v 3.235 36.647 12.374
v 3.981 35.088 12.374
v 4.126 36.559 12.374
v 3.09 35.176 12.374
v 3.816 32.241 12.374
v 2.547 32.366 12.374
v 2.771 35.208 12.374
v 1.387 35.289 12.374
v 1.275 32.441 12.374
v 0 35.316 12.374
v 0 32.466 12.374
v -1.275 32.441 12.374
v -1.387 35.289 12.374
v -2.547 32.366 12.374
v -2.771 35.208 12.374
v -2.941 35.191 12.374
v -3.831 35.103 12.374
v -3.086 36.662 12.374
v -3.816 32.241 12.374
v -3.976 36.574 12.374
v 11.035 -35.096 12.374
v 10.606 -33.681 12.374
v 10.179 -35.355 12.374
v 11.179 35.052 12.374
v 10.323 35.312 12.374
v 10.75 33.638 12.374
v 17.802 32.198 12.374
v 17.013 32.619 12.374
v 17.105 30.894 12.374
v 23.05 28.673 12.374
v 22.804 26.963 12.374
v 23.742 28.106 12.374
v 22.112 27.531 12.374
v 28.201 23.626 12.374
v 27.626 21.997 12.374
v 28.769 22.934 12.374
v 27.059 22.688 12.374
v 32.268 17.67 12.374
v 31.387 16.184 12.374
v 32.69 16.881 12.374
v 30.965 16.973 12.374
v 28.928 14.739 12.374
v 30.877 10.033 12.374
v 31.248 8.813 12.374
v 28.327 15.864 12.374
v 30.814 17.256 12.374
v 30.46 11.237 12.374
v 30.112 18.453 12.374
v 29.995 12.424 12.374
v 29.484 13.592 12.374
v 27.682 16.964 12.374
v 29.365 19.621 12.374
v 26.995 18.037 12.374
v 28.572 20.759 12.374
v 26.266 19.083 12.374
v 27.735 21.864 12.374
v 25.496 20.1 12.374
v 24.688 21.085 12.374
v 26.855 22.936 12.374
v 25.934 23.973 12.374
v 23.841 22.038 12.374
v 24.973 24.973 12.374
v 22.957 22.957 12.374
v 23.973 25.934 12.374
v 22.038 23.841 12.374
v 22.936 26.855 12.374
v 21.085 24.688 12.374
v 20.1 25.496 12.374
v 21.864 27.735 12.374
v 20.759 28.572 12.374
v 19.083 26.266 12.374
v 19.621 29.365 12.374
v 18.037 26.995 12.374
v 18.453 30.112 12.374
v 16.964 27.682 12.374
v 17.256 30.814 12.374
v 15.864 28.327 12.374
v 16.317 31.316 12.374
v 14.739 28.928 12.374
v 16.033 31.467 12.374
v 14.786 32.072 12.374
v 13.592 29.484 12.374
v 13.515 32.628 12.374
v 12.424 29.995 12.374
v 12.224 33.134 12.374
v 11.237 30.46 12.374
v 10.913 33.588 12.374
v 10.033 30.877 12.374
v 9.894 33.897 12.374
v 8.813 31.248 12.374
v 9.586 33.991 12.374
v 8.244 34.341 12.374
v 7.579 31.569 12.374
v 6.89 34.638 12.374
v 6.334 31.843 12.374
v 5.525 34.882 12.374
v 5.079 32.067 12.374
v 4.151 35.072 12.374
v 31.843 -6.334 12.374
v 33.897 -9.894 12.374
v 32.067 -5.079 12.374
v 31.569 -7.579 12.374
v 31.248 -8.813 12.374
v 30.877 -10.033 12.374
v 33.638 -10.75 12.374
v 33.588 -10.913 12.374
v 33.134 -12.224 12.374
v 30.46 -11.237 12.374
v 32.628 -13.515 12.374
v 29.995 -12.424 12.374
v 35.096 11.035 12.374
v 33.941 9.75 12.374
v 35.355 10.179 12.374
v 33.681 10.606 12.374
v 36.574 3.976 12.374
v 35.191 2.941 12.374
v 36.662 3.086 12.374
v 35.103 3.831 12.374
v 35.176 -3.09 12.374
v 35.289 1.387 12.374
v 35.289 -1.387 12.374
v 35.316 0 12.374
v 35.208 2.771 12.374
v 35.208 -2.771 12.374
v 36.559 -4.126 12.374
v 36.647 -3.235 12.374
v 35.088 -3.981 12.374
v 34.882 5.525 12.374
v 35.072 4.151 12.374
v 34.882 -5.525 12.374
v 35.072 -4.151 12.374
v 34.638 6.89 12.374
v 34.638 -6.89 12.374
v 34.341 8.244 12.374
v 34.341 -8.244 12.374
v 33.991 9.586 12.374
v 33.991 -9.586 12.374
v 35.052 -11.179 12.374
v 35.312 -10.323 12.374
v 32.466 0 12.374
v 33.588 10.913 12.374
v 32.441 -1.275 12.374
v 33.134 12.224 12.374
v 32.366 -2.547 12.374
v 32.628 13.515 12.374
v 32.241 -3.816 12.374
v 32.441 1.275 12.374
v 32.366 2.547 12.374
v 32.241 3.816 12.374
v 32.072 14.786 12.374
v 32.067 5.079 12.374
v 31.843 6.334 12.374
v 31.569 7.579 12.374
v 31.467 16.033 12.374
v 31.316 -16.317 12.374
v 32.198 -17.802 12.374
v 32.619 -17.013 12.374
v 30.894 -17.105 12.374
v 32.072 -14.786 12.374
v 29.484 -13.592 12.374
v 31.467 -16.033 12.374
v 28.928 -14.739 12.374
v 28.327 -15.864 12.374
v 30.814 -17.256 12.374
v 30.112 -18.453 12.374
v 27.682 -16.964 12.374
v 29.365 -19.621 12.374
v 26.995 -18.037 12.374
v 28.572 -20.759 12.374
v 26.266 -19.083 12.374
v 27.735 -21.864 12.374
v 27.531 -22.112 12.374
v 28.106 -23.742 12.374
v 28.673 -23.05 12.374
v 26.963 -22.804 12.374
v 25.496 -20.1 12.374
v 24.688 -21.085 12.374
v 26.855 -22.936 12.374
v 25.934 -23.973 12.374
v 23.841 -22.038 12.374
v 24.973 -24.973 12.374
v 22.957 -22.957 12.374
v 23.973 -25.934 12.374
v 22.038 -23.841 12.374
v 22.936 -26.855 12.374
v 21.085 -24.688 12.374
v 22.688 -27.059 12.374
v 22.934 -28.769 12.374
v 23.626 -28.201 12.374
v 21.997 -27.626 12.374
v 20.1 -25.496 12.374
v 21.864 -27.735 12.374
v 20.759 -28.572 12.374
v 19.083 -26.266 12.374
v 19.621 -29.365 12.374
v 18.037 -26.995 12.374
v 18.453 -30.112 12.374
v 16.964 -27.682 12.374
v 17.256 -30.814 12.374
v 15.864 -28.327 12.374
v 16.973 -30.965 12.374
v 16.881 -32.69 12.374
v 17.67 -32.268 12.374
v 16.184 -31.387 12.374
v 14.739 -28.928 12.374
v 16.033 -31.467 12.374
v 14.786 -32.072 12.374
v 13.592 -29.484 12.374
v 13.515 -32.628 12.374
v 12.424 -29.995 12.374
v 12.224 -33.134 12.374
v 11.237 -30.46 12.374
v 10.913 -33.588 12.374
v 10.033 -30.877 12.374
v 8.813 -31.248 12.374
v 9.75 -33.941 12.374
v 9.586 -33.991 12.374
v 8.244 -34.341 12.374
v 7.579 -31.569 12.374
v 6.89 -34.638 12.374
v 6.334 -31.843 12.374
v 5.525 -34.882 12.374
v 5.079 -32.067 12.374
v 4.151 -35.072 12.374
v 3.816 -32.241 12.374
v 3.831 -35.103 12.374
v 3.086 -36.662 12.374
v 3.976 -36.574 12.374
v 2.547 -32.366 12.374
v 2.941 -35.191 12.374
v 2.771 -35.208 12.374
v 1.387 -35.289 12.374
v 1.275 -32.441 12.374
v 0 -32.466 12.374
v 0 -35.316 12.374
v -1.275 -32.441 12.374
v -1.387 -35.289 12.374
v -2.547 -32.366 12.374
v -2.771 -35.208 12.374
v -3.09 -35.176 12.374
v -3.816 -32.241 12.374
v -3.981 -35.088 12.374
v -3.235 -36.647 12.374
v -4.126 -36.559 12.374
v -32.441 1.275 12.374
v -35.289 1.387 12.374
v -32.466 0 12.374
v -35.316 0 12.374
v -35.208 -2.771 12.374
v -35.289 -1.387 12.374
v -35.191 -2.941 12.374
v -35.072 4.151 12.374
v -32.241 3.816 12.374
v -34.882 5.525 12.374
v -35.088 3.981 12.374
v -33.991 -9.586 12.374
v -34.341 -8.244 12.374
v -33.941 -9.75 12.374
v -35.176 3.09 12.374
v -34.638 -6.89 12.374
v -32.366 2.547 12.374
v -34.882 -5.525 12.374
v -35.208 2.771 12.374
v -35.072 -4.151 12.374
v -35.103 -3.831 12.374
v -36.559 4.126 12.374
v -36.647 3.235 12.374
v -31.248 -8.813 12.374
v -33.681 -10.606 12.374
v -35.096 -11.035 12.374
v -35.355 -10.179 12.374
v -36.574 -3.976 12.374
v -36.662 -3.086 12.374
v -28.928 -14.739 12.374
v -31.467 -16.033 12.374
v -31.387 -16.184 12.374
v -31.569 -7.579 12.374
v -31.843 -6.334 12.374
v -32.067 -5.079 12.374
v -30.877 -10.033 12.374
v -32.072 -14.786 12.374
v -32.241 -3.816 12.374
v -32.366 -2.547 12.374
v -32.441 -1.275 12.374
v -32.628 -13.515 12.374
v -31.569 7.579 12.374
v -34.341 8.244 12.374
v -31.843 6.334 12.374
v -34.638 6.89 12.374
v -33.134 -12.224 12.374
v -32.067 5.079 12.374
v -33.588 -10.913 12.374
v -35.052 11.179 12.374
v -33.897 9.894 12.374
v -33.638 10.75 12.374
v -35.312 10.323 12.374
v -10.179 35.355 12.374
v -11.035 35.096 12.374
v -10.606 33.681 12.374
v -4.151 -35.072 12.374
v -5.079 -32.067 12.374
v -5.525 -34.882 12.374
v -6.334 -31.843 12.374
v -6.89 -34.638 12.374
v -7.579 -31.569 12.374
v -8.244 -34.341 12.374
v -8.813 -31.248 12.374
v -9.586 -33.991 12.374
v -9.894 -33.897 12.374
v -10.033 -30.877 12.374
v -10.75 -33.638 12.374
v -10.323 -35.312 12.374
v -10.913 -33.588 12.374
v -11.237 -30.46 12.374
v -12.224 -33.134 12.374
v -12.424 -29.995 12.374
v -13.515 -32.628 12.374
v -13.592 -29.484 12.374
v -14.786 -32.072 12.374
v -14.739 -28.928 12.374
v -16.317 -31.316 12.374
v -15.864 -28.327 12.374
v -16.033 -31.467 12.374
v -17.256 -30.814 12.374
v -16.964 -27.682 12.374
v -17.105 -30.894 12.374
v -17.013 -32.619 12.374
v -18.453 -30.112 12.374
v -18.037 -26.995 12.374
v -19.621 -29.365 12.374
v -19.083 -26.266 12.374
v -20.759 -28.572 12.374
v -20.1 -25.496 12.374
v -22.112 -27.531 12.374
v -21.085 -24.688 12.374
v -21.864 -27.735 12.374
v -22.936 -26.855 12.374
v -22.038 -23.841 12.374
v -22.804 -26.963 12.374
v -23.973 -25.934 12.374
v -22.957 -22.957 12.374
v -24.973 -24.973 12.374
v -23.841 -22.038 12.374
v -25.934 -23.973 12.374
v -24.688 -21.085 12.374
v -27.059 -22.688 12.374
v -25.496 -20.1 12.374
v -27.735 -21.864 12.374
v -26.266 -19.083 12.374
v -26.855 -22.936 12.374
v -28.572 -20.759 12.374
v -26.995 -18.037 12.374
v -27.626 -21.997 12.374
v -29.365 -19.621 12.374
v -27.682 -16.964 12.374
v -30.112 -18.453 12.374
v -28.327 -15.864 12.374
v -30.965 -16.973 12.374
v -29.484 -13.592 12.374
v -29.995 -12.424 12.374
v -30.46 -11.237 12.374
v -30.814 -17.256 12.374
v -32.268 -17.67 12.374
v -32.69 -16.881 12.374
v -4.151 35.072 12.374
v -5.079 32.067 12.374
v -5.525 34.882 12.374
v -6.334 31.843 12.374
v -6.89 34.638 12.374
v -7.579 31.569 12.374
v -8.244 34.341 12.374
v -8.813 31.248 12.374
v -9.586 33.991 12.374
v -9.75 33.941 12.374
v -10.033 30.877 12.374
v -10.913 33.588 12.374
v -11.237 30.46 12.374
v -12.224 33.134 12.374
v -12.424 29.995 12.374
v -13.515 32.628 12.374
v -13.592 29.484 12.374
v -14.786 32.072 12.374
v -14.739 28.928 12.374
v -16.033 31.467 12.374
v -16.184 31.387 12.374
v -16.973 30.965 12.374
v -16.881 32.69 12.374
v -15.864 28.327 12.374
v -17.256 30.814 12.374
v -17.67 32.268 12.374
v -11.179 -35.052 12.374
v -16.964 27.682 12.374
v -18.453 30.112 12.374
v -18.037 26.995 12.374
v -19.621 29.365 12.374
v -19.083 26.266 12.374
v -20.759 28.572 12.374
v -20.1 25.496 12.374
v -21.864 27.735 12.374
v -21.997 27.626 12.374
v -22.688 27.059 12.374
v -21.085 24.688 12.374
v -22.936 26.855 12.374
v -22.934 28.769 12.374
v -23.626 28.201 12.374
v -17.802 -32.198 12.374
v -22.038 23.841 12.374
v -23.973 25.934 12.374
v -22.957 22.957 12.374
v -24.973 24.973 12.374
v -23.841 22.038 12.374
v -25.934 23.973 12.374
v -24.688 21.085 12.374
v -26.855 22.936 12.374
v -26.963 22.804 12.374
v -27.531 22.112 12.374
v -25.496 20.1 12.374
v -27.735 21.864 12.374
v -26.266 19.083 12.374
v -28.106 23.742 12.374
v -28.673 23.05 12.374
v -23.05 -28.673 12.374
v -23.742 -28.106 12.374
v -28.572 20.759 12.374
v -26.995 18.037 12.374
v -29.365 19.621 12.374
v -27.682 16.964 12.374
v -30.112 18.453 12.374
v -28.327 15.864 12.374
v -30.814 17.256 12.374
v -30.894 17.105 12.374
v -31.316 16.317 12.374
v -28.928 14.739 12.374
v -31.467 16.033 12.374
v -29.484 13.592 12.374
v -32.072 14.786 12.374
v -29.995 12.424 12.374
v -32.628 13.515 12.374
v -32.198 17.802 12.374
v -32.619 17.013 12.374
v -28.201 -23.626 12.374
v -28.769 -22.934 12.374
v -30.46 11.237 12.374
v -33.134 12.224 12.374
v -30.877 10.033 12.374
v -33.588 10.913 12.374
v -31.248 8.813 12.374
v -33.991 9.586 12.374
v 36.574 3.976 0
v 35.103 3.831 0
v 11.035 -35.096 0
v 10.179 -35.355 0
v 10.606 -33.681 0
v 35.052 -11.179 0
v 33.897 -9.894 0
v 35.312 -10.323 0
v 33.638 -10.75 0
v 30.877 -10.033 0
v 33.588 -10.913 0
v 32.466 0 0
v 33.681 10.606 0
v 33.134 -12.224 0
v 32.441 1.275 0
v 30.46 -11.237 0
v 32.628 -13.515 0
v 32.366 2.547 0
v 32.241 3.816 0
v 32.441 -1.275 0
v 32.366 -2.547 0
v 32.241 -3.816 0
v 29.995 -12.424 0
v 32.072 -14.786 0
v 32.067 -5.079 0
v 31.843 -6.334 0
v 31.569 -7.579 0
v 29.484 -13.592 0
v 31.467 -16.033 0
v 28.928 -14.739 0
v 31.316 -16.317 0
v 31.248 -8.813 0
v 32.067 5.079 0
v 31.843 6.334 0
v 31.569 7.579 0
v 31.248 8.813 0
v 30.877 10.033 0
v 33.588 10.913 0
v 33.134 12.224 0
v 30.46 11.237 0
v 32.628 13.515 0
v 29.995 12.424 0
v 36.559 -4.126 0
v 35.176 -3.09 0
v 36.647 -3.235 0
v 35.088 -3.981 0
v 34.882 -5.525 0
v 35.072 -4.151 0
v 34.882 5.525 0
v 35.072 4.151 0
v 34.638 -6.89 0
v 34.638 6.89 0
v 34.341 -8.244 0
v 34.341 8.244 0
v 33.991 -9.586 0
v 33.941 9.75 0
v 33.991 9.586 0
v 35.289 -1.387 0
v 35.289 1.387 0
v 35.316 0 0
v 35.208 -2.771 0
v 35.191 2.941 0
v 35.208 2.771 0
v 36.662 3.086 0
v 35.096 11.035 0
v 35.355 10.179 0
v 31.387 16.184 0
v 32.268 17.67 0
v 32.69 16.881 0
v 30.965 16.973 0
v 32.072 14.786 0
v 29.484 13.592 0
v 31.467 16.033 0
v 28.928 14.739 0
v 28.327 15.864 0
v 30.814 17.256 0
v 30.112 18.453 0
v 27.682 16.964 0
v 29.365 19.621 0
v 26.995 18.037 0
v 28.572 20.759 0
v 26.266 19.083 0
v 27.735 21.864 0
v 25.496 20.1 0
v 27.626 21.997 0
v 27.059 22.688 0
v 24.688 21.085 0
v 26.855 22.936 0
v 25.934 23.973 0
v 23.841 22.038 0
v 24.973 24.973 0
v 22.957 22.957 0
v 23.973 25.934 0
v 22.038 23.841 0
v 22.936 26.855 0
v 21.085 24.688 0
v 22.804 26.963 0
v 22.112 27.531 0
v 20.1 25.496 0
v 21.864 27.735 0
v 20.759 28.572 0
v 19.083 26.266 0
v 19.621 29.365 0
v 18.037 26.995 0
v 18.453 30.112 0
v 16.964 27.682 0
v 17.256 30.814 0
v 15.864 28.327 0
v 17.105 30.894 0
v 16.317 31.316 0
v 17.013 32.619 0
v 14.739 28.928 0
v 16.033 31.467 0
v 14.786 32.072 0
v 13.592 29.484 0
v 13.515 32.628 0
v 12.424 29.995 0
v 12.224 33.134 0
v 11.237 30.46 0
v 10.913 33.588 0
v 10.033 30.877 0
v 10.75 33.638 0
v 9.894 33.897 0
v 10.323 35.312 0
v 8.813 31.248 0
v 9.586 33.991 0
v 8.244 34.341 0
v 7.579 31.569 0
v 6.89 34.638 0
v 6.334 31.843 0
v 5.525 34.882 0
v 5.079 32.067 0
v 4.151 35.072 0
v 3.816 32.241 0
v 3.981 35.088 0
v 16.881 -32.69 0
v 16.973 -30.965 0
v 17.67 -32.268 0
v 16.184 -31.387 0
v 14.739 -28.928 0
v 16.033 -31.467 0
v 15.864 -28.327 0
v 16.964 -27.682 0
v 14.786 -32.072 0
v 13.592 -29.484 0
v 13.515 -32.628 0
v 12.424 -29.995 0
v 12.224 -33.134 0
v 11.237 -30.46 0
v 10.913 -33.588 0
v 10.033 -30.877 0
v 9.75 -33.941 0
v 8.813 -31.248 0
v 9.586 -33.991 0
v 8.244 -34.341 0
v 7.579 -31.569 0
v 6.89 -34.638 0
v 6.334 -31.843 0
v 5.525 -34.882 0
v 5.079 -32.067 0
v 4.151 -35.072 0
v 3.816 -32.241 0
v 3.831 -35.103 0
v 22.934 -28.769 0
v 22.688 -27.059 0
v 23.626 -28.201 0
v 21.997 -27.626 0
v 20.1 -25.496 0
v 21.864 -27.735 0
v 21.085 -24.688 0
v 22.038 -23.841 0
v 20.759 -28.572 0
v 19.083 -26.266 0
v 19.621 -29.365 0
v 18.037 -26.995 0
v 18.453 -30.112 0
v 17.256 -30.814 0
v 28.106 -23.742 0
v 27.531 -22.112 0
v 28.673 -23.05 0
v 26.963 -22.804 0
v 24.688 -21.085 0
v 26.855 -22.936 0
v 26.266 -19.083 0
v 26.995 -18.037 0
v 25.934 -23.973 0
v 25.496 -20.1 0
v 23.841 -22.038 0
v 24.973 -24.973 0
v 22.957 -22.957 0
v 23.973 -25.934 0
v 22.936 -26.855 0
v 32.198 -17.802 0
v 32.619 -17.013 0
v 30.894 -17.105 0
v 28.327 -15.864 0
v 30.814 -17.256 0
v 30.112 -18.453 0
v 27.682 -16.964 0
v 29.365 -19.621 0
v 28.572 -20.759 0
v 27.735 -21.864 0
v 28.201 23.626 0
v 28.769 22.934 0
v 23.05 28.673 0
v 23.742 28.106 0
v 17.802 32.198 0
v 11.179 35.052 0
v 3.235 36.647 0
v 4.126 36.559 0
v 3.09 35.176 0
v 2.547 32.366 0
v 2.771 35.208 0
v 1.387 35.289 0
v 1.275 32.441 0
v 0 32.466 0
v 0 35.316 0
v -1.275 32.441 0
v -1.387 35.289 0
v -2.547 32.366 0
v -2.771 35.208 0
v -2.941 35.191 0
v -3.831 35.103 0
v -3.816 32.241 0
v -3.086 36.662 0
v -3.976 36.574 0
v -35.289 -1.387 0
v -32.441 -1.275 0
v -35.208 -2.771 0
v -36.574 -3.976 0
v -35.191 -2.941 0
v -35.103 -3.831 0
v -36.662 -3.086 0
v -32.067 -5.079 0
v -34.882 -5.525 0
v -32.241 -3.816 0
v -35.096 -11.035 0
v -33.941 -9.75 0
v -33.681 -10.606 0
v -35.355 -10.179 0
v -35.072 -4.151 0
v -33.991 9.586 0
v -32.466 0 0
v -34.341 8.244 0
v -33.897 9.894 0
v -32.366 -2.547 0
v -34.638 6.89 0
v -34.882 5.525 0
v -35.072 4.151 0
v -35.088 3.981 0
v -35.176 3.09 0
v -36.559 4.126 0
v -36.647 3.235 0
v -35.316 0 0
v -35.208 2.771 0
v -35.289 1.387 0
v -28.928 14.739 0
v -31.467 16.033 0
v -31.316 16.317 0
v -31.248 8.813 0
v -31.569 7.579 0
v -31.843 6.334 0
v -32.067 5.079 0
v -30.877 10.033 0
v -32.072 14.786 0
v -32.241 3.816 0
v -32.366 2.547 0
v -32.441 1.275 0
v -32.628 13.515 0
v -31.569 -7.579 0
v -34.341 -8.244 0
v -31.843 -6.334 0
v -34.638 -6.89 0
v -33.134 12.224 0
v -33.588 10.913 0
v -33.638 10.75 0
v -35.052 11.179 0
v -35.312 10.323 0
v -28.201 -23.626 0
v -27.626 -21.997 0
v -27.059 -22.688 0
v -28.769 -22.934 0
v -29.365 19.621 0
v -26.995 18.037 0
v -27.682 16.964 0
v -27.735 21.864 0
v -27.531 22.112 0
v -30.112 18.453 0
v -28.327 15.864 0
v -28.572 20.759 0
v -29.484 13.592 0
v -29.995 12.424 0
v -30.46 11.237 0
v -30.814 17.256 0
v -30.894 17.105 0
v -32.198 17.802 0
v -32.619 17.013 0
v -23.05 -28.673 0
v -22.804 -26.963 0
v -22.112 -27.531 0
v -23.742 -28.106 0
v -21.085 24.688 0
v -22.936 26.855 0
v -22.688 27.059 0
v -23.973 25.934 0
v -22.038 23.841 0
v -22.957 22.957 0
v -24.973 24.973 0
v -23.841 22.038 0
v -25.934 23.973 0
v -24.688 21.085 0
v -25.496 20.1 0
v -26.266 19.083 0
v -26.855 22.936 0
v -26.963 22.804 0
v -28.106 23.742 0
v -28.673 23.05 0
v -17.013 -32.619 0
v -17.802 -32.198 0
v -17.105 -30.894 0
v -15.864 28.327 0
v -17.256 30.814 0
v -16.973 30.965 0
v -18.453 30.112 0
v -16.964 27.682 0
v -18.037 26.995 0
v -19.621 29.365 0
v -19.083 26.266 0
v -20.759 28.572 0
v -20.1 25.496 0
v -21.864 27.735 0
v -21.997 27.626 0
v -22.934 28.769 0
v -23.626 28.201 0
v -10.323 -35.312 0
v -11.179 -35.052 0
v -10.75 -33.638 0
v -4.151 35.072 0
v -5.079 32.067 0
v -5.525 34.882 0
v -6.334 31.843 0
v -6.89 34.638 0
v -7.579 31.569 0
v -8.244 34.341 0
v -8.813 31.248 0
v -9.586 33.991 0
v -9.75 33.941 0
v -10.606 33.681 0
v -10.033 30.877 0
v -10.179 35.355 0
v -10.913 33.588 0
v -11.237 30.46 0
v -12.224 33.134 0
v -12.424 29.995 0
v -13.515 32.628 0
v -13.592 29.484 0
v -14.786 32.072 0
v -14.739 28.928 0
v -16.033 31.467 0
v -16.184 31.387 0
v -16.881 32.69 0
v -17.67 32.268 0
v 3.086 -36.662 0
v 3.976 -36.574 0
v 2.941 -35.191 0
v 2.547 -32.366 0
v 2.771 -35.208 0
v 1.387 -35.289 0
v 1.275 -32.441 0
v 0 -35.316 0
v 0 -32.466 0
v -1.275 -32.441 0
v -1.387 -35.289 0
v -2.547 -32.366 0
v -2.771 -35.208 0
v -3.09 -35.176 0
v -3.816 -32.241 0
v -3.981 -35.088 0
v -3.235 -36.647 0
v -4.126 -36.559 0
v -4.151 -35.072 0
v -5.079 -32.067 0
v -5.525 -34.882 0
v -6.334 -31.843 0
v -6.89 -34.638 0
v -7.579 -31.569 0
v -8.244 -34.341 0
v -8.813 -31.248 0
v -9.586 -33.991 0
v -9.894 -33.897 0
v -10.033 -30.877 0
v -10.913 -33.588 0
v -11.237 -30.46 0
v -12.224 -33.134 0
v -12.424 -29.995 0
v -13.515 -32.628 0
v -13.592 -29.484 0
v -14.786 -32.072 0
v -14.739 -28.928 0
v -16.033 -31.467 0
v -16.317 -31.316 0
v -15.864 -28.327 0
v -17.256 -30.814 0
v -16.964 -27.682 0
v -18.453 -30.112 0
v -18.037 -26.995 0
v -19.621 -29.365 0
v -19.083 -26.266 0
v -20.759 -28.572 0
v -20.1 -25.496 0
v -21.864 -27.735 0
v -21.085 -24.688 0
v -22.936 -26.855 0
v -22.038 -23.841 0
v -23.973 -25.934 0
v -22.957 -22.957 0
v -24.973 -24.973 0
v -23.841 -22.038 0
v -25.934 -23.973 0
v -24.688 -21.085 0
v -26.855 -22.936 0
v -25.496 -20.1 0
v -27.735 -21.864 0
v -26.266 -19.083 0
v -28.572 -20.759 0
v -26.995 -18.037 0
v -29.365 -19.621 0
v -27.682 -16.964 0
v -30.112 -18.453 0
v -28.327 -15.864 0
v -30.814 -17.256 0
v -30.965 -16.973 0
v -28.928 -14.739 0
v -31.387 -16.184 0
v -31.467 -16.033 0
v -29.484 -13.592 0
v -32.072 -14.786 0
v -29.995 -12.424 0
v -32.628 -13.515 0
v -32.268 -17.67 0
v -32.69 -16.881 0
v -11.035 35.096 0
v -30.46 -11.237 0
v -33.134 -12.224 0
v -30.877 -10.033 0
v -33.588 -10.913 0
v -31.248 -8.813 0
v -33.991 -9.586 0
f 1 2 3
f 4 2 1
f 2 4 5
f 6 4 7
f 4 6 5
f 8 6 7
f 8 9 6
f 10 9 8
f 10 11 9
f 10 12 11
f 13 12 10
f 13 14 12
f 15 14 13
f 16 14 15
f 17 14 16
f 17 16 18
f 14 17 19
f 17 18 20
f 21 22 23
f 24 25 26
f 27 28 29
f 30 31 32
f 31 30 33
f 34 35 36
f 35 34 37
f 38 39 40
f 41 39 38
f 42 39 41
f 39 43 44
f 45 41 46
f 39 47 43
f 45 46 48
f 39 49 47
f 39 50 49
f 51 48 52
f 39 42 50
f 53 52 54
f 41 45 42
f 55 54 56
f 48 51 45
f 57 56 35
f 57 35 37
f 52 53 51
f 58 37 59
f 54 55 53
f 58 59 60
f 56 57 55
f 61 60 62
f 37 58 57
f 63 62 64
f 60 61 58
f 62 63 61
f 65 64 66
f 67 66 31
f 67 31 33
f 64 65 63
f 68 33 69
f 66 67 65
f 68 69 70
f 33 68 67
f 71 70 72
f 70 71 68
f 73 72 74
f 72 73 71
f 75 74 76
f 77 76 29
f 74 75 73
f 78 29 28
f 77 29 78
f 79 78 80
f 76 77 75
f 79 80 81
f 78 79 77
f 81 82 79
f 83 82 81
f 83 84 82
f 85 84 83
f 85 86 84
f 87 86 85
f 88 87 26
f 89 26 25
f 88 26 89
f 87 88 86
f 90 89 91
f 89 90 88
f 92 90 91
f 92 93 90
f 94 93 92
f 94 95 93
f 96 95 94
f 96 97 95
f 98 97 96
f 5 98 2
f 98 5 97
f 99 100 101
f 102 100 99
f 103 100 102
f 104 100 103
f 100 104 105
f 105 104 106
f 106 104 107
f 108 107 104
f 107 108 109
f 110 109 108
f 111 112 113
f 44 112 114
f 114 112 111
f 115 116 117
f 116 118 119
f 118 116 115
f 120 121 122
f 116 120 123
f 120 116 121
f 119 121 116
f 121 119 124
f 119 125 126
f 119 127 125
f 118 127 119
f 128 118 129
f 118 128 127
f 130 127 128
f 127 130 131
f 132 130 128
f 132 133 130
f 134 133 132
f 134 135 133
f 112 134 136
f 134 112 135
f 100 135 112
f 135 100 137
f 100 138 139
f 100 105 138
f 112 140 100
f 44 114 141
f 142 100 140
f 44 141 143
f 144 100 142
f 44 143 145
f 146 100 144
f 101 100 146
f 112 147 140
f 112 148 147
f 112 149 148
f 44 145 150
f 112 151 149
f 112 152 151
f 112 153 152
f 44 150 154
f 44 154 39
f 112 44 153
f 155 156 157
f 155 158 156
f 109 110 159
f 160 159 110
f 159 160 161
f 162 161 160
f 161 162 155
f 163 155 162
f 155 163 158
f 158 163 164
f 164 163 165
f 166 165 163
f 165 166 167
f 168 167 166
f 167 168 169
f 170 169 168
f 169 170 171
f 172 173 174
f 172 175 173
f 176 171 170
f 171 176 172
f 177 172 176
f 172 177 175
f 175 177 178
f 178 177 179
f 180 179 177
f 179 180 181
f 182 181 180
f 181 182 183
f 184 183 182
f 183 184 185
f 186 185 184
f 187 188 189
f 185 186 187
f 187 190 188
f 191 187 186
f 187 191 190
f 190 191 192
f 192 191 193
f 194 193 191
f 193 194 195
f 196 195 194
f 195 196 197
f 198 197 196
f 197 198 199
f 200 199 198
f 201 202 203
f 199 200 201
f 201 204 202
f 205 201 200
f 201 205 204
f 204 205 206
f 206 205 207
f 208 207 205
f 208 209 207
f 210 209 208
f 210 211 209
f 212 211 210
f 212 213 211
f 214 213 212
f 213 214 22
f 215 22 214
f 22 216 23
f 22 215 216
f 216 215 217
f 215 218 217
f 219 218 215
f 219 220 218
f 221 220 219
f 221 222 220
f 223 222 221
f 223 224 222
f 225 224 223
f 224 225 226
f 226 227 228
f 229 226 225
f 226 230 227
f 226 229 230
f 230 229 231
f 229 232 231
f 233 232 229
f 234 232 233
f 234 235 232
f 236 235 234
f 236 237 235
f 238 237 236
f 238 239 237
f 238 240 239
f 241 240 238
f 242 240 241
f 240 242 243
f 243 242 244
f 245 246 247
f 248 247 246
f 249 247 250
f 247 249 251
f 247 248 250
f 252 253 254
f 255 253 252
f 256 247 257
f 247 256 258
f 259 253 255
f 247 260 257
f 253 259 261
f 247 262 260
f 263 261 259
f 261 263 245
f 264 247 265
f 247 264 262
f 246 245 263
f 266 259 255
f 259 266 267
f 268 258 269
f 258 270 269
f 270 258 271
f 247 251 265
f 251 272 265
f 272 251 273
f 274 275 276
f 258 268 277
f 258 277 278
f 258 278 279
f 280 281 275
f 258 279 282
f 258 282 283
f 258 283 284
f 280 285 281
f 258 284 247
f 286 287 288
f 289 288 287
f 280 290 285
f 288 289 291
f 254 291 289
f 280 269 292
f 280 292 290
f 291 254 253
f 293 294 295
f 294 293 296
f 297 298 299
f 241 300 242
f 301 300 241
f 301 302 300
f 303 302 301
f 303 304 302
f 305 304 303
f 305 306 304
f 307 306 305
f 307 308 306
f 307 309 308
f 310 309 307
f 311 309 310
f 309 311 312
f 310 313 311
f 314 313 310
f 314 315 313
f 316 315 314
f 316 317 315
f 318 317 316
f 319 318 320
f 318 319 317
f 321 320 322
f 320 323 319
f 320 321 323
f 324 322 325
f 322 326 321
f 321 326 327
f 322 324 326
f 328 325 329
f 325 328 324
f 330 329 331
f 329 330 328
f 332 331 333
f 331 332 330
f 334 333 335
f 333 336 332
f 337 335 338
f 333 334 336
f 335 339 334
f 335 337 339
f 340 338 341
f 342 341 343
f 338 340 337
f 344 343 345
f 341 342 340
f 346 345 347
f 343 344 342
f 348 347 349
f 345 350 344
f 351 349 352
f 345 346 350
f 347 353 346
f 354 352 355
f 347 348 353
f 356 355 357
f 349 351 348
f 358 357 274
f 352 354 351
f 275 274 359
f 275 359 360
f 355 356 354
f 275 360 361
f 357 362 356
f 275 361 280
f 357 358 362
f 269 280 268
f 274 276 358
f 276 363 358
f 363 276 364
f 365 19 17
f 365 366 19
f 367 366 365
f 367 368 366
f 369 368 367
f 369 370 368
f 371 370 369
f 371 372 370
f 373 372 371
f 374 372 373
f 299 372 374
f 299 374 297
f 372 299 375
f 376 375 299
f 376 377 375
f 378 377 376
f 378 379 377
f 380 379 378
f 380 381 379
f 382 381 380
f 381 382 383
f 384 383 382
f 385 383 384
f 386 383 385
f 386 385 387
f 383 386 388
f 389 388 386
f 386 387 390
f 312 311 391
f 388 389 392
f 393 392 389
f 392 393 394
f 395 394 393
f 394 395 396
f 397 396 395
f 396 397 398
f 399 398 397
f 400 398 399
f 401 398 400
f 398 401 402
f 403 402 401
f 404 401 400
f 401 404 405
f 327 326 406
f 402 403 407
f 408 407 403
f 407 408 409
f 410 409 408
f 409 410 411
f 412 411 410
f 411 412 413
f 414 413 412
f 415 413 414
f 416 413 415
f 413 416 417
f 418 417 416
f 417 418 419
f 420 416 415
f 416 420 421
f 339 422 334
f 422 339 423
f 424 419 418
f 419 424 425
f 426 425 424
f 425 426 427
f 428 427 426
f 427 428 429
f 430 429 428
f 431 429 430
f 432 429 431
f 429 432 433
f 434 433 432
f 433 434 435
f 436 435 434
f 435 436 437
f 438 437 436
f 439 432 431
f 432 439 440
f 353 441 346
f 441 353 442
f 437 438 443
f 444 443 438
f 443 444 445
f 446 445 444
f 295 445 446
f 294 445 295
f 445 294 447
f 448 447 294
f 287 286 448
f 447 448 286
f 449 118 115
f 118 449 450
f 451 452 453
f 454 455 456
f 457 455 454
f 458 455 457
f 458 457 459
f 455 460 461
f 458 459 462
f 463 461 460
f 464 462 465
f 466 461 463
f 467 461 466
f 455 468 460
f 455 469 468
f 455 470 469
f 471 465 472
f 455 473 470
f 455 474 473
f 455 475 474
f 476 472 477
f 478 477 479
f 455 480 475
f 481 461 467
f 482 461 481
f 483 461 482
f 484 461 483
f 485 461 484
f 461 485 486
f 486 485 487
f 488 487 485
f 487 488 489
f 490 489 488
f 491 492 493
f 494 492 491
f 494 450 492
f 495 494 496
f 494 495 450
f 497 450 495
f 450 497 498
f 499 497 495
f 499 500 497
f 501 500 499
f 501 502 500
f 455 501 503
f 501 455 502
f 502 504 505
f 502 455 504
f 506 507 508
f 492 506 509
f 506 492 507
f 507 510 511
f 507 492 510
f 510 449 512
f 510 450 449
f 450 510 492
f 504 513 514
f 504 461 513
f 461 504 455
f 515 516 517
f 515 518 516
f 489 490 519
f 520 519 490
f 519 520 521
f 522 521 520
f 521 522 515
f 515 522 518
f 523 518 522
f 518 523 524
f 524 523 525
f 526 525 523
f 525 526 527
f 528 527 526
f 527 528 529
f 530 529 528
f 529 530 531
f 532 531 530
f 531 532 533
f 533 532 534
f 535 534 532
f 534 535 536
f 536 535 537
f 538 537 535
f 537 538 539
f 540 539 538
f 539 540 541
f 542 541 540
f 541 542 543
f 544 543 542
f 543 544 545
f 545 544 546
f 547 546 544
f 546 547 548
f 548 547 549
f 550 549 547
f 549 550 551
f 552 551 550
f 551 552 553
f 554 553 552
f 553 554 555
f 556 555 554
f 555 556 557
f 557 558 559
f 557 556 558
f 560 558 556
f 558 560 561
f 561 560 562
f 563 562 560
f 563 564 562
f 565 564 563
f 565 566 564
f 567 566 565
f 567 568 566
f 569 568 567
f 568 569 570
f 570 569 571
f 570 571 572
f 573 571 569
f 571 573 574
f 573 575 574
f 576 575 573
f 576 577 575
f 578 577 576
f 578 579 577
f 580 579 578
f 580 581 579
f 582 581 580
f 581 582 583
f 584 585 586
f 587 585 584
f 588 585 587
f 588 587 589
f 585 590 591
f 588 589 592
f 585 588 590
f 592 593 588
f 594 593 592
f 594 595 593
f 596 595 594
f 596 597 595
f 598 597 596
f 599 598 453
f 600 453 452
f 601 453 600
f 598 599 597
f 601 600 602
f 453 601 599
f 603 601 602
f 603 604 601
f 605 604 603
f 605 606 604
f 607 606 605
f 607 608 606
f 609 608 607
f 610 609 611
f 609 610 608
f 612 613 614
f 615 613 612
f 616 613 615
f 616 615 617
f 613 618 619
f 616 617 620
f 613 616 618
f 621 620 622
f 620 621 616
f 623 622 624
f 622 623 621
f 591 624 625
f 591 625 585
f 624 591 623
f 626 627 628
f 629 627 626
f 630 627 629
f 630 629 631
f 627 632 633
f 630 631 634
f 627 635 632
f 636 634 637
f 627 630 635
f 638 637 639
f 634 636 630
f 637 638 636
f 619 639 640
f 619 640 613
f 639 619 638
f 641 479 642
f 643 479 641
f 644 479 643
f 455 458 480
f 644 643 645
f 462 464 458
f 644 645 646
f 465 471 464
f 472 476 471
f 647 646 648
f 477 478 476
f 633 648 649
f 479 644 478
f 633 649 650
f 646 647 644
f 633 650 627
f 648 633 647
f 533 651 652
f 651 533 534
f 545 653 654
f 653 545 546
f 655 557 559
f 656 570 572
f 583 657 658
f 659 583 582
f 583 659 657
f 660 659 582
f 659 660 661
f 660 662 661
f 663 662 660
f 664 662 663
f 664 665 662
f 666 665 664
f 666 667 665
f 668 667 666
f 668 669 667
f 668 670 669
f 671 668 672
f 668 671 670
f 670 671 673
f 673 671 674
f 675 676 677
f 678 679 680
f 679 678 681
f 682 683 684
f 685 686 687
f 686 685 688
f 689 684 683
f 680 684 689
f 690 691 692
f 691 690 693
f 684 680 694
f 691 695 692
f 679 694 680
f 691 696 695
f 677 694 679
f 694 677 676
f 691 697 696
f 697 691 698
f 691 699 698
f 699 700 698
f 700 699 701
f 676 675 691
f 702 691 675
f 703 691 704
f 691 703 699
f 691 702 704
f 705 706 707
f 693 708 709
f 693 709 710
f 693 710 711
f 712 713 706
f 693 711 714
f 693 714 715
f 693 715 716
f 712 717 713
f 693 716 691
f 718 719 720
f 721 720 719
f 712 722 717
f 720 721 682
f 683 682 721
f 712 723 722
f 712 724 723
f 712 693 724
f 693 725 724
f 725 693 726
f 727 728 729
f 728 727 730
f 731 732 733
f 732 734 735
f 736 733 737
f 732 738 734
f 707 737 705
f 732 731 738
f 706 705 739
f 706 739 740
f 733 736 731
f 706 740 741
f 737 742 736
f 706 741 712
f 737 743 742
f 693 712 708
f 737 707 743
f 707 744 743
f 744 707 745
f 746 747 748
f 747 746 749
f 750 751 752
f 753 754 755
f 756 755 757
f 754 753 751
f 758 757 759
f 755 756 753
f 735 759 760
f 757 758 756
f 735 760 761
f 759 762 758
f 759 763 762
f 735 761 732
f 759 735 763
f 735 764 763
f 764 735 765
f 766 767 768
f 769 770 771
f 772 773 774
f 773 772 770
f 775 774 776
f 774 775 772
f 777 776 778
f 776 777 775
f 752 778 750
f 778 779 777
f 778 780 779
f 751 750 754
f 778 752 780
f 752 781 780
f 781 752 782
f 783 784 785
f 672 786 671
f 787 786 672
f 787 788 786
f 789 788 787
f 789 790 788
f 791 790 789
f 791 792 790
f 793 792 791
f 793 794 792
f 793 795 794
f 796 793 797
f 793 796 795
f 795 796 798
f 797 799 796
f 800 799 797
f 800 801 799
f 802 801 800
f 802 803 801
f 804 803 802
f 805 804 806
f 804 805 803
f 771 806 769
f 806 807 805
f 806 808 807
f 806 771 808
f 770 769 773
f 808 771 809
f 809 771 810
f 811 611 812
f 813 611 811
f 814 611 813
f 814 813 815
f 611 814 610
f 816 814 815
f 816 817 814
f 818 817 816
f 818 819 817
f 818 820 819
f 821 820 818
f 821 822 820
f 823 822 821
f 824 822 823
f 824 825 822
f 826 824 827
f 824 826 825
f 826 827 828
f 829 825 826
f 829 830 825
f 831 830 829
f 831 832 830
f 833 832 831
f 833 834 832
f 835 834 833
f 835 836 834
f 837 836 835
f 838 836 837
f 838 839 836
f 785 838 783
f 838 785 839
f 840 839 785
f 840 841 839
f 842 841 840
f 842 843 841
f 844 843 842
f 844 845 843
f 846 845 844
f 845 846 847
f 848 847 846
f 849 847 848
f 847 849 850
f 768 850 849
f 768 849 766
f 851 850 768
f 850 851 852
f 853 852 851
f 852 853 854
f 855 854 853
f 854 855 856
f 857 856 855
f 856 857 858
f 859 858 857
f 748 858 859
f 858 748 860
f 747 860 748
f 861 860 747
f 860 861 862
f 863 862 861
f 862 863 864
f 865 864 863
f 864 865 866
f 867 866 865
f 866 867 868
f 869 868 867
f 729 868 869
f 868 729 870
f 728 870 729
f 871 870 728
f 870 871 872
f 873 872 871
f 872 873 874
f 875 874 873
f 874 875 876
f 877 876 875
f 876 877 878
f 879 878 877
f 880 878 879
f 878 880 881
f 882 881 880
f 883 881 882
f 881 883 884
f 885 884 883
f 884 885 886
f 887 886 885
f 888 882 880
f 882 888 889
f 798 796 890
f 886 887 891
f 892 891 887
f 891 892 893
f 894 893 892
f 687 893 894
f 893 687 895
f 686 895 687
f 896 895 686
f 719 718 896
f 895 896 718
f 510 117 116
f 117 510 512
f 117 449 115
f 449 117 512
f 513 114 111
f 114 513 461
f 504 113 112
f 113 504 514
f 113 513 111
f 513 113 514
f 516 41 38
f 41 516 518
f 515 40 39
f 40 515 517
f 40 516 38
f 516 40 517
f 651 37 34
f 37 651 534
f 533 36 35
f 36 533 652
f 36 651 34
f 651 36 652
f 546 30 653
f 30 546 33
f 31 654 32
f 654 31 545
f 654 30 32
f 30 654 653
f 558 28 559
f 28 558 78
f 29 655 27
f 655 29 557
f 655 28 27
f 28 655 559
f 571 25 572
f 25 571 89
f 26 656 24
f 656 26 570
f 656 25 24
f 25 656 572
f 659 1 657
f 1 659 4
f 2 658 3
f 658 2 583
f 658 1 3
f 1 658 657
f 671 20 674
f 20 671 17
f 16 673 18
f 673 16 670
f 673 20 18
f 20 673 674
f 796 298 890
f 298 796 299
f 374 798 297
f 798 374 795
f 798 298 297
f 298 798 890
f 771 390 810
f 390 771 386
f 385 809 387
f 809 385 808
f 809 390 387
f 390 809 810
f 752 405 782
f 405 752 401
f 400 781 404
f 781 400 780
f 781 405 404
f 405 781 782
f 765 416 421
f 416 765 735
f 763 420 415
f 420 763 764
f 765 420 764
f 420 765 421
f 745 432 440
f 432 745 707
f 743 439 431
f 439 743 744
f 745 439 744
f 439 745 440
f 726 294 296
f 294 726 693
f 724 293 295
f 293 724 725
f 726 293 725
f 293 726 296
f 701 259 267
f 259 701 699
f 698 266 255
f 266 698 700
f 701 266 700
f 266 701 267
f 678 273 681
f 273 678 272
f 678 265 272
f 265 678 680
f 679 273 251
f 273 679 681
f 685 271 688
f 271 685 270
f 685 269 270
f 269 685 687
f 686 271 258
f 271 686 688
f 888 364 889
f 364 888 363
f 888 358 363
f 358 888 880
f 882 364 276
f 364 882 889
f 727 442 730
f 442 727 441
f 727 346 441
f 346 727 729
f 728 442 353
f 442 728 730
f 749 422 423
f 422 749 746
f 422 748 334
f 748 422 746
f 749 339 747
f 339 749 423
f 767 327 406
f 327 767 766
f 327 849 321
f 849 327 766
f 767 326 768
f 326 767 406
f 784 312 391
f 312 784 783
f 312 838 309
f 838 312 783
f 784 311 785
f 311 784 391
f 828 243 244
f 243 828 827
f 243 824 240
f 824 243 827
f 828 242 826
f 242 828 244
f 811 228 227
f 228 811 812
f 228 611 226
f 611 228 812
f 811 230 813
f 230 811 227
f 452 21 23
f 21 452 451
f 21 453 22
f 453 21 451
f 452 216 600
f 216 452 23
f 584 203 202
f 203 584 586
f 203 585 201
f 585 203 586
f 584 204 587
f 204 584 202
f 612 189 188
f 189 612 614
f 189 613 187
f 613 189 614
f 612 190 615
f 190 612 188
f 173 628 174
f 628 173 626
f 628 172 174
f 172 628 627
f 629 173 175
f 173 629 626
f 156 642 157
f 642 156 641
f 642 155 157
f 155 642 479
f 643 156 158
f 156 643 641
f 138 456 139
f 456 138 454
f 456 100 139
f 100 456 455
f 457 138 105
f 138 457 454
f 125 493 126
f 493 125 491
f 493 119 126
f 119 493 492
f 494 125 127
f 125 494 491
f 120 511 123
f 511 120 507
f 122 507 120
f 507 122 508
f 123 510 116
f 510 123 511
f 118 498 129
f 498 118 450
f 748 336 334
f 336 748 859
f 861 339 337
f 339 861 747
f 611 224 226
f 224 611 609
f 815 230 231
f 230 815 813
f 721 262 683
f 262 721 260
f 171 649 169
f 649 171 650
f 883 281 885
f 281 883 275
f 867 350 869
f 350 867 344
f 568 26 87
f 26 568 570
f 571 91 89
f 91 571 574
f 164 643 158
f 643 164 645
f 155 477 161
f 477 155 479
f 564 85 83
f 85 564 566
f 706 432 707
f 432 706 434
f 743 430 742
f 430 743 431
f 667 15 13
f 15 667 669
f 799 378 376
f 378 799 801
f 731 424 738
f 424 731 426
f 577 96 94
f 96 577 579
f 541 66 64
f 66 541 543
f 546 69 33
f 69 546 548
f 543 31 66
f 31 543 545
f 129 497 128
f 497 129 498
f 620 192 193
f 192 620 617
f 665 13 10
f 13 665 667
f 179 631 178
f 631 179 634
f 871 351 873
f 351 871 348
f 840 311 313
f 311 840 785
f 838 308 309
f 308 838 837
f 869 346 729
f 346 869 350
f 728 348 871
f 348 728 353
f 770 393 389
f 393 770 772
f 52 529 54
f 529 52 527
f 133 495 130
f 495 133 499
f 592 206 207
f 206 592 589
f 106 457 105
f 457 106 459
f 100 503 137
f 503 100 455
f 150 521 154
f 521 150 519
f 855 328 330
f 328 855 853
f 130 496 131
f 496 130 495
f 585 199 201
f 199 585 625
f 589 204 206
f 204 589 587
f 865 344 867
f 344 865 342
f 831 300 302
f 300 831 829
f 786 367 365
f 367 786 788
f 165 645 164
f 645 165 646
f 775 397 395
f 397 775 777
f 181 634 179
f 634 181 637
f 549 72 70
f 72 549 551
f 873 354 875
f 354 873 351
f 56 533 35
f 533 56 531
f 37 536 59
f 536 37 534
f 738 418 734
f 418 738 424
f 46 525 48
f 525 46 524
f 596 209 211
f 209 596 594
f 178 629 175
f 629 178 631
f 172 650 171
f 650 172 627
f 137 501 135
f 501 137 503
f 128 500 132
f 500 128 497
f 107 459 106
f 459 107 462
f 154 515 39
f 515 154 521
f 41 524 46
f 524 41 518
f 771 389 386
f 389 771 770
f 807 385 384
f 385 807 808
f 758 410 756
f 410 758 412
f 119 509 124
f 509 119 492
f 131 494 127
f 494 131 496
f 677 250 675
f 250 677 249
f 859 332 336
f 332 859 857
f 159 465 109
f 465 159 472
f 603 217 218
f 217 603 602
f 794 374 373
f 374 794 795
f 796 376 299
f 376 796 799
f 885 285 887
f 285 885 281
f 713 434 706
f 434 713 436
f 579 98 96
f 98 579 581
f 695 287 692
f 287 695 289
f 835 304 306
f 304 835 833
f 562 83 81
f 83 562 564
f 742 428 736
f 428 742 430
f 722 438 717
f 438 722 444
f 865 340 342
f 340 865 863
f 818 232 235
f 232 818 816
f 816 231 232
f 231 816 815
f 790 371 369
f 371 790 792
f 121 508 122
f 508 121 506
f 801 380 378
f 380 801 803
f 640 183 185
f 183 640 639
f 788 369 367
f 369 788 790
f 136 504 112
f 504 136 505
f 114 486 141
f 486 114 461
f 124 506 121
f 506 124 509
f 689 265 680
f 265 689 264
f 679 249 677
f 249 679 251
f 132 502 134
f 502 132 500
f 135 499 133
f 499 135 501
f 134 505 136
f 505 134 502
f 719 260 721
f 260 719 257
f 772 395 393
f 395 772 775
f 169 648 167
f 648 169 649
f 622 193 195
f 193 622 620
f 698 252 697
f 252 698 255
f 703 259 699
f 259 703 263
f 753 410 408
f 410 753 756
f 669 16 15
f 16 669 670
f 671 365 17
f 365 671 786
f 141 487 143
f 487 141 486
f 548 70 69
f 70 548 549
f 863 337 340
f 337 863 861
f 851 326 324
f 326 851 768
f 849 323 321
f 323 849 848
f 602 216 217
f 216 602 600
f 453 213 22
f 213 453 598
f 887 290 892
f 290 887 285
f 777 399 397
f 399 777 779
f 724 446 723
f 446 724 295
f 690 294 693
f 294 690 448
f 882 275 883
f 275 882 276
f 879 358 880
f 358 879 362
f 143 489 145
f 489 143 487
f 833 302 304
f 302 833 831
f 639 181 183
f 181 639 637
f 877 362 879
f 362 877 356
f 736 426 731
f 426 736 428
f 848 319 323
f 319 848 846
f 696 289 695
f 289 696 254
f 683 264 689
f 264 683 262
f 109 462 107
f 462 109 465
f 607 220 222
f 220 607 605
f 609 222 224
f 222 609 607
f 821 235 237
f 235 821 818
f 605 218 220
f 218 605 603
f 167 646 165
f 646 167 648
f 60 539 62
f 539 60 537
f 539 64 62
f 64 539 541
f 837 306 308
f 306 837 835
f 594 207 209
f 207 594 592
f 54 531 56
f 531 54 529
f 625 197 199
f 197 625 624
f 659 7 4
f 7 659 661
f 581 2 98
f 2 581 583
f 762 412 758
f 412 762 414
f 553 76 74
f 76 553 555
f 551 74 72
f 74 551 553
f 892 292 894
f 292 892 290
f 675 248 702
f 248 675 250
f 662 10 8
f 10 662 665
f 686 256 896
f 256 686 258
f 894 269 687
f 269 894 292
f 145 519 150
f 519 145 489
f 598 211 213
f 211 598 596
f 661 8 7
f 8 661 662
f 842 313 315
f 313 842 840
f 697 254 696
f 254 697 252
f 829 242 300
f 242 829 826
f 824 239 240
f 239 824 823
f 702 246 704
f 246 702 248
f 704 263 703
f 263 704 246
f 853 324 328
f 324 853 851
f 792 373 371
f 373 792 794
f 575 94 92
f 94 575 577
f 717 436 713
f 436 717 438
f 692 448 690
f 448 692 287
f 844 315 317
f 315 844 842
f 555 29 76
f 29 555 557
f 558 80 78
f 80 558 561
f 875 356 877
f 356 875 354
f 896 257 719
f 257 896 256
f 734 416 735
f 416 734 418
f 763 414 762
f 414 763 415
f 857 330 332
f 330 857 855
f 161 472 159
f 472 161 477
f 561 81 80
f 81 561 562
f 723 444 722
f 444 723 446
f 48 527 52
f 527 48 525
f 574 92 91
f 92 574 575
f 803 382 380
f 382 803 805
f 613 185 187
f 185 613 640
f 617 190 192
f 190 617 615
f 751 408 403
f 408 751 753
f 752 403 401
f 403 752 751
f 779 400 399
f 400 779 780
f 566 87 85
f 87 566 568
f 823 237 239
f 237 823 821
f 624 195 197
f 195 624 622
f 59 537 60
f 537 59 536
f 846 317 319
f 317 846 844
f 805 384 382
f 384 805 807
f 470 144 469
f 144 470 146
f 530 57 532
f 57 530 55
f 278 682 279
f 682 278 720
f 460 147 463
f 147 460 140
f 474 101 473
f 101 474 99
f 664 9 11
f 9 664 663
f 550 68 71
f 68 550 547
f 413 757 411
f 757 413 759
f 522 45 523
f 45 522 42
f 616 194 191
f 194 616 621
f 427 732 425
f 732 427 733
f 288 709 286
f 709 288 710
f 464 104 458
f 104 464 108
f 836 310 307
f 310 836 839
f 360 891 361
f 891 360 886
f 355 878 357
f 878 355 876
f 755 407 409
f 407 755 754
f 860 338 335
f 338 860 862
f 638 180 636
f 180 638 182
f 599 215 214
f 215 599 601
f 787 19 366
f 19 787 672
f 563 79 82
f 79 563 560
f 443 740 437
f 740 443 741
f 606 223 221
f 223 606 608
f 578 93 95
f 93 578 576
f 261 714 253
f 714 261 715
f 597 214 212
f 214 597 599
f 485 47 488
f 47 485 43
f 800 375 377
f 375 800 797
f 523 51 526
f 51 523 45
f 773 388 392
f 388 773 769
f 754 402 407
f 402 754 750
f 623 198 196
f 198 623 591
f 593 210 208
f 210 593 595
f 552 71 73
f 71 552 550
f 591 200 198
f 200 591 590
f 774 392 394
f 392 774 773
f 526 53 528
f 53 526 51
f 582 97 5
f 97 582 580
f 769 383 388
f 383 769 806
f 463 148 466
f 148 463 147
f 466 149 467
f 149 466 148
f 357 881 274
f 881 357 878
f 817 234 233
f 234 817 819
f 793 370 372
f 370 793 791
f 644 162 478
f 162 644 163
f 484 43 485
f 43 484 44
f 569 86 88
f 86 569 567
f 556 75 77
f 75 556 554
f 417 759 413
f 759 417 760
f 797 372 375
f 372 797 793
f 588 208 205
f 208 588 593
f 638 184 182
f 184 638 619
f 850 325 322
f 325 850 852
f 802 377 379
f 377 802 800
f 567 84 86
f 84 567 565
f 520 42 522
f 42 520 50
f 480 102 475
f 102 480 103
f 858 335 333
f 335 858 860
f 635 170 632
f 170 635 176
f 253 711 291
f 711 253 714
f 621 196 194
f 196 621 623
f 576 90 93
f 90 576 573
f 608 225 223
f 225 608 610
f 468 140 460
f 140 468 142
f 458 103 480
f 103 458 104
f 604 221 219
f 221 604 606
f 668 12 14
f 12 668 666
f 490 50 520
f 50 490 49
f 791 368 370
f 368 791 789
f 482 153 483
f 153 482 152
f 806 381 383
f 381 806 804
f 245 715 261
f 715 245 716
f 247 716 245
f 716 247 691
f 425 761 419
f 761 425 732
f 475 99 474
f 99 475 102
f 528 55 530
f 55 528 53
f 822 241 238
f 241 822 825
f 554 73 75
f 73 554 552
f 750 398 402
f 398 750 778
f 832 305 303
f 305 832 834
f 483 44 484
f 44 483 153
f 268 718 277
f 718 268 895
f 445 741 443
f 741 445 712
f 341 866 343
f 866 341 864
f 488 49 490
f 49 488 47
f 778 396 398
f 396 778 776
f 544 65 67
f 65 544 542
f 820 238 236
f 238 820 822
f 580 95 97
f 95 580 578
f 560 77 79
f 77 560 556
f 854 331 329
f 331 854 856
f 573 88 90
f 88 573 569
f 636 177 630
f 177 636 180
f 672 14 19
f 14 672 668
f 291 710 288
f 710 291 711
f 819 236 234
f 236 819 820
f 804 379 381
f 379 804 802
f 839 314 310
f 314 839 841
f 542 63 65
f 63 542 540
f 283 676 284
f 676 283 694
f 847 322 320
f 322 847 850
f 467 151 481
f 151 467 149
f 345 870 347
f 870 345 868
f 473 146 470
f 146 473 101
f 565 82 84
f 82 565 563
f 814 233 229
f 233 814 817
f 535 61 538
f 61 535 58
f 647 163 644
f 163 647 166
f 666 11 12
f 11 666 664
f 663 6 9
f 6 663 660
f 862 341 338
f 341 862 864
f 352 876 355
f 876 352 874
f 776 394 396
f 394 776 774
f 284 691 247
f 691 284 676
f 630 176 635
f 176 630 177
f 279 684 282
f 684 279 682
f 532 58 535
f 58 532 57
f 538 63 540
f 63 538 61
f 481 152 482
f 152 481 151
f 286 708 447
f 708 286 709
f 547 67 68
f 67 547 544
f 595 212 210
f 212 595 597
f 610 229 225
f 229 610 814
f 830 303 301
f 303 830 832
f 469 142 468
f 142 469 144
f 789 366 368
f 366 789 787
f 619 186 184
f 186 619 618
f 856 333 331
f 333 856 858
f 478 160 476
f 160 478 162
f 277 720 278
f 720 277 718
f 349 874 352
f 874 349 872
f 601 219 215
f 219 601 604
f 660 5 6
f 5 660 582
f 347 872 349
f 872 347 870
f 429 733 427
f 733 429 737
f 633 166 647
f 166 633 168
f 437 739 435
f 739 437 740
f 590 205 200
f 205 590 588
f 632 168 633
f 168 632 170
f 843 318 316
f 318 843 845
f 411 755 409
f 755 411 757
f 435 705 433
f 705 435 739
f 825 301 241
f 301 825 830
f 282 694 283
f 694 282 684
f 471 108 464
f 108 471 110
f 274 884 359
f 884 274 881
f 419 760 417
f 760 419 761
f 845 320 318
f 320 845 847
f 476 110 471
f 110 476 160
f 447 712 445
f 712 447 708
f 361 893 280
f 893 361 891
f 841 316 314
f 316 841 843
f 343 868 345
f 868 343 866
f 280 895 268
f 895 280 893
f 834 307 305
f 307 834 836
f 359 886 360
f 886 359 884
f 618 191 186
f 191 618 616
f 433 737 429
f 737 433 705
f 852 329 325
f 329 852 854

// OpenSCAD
// file: motor_lib.scad
// Biblioteca del motor DronSwarm (M6). Las medidas vienen de <dron>_motor_params.scad (generado). Unidades: mm.
// Sin hull/minkowski (CLAUDE.md): todo con cilindros, polígonos y extrusiones.
$fn = 160;

// ---------- láser ----------
module stator_lamination_2d() {           // lámina del estator: 0.2 mm de acero al silicio (NO20)
    difference() {
        circle(r = r_s);
        circle(r = r_bore);
        for (s = slots) polygon(s);
        translate([r_bore - 0.01, -1.0]) square([1.2, 2.0]);                 // chaveta: alinea las láminas y fija al tubo
    }
}
module rotor_ring_2d() {                  // anillo del rotor: acero común 1 mm, se apilan n_ring
    difference() {
        circle(r = r_out);
        circle(r = r_mag_out + fit_slide / 2);
        translate([r_mag_out, -0.75]) square([0.8, 1.5]);                     // marca de orientación (polo 1)
    }
}

// ---------- impresas ----------
module cap() {                            // tapa: lleva la hélice y el eje; el anillo del rotor entra 2 mm en la ranura
    hub_r = shaft / 2 + 3.5;
    difference() {
        union() {
            cylinder(r = r_out + 1.2, h = cap_t);
            translate([0, 0, -2]) difference() {                                 // pollera que abraza el anillo
                cylinder(r = r_out + 1.2, h = 2);
                translate([0, 0, -0.1]) cylinder(r = r_out + print_clear / 2, h = 2.2);
            }
            cylinder(r = hub_r, h = cap_t + 4);                                  // cubo del eje
        }
        translate([0, 0, -1]) cylinder(d = shaft + fit_press, h = cap_t + 6);   // eje a presión
        translate([0, 0, cap_t + 2]) rotate([0, 90, 0]) cylinder(d = 2.6, h = hub_r + 1);   // prisionero M3
        for (i = [0 : prop_n - 1]) rotate(360 / prop_n * i + 45)
            translate([prop_pcd / 2, 0, -1]) cylinder(d = prop_bolt, h = cap_t + 6);
        for (i = [0 : prop_n - 1]) rotate(360 / prop_n * i)                      // ventilación entre los tornillos de la hélice
            translate([0, 0, -1]) linear_extrude(cap_t + 2)
                polygon([[ (hub_r + 2) * cos(-14), (hub_r + 2) * sin(-14)], [ (r_mag_in - 3) * cos(-18), (r_mag_in - 3) * sin(-18)],
                         [ (r_mag_in - 3) * cos(18), (r_mag_in - 3) * sin(18)], [ (hub_r + 2) * cos(14), (hub_r + 2) * sin(14)]]);
    }
}

module base() {                           // base: tubo con los 2 rodamientos, sostiene el estator, se atornilla al DMI
    tube_h = l_stack + 2 * overhang + 1;
    difference() {
        union() {
            cylinder(r = max(r_bore + 5, dmi_pcd / 2 + 4), h = base_t);
            cylinder(r = r_bore + fit_press / 2, h = base_t + tube_h);               // el estator se pega sobre el tubo
            translate([r_bore - 0.2, -0.9, base_t]) cube([1.0, 1.8, tube_h]);        // chaveta (entra en la muesca de las láminas)
        }
        translate([0, 0, -1]) cylinder(d = bearing_od + fit_press, h = bearing_w + 1);                  // rodamiento inferior
        translate([0, 0, base_t + tube_h - bearing_w]) cylinder(d = bearing_od + fit_press, h = bearing_w + 1); // superior
        translate([0, 0, -1]) cylinder(d = shaft + 1.0, h = base_t + tube_h + 2);
        for (i = [0 : dmi_n - 1]) rotate(360 / dmi_n * i + 45) translate([dmi_pcd / 2, 0, -1]) cylinder(d = dmi_bolt, h = base_t + 2);
        translate([r_bore - 4, -2, -1]) cube([6, 4, base_t + 2]);                 // salida de los 3 cables de fase
    }
}

module magnet_jig() {                     // peine: se mete dentro del anillo y deja cada imán en su lugar (paso de polo exacto)
    rib = 2 * PI * r_mag_in / poles - magnet_w;      // espacio entre imanes en el diámetro interior
    difference() {
        union() {
            cylinder(r = r_mag_in - 0.15, h = l_stack + 4);
            for (i = [0 : poles - 1]) rotate(360 / poles * (i + 0.5))
                translate([r_mag_in - 0.5, -max(rib, 0.6) / 2, 0]) cube([h_magnet + 0.3, max(rib, 0.6) - 0.15, l_stack + 4]);
        }
        translate([0, 0, -1]) cylinder(r = r_mag_in - 3, h = l_stack + 6);
    }
}

module stack_mandrel() {                  // mandril de apilado: alinea las láminas por el agujero y la chaveta mientras cura el adhesivo
    difference() {
        union() {
            cylinder(r = r_bore - 0.05, h = l_stack + 10);
            translate([r_bore - 0.3, -0.9, 0]) cube([1.0, 1.8, l_stack + 10]);
            cylinder(r = r_s + 3, h = 3);
        }
        translate([0, 0, -1]) cylinder(d = 5.5, h = l_stack + 12);                // varilla roscada M5 para prensar
    }
}

module winding_holder() {                 // soporte para bobinar a mano: sujeta el estator por el agujero, con mango
    union() {
        cylinder(r = r_bore - 0.1, h = l_stack + 2);
        translate([r_bore - 0.4, -0.85, 0]) cube([1.0, 1.7, l_stack + 2]);
        translate([0, 0, -40]) cylinder(r = 7, h = 40);
    }
}

// ---------- ensamble (para ver) ----------
module assembly() {
    color("#b0b0b0") translate([0, 0, base_t + overhang]) linear_extrude(l_stack) stator_lamination_2d();
    color("#b87333") for (s = slots) translate([0, 0, base_t + 0.5]) linear_extrude(l_stack + 2 * overhang - 1) offset(r = -0.35) polygon(s);
    color("#4a4a4a") translate([0, 0, base_t + overhang - 1]) linear_extrude(l_stack + 2) rotor_ring_2d();
    color("#2a78d6") for (i = [0 : poles - 1]) rotate(360 / poles * i)
        translate([0, 0, base_t + overhang]) rotate_extrude(angle = 360 / poles * pole_arc)
            translate([r_mag_in, 0]) square([h_magnet, l_stack]);
    color("#eb6834") translate([0, 0, base_t + 2 * overhang + l_stack + 1]) cap();
    color("#eb6834", 0.9) base();
    color("#dddddd") translate([0, 0, -6]) cylinder(d = shaft, h = base_t + 2 * overhang + l_stack + cap_t + 14);
}
// main file
// DS-D · plantilla_imanes (M6). Generado por motor/fabricacion/gen_cad.py
include <ds_d_motor_params.scad>
include <motor_lib.scad>
magnet_jig();
